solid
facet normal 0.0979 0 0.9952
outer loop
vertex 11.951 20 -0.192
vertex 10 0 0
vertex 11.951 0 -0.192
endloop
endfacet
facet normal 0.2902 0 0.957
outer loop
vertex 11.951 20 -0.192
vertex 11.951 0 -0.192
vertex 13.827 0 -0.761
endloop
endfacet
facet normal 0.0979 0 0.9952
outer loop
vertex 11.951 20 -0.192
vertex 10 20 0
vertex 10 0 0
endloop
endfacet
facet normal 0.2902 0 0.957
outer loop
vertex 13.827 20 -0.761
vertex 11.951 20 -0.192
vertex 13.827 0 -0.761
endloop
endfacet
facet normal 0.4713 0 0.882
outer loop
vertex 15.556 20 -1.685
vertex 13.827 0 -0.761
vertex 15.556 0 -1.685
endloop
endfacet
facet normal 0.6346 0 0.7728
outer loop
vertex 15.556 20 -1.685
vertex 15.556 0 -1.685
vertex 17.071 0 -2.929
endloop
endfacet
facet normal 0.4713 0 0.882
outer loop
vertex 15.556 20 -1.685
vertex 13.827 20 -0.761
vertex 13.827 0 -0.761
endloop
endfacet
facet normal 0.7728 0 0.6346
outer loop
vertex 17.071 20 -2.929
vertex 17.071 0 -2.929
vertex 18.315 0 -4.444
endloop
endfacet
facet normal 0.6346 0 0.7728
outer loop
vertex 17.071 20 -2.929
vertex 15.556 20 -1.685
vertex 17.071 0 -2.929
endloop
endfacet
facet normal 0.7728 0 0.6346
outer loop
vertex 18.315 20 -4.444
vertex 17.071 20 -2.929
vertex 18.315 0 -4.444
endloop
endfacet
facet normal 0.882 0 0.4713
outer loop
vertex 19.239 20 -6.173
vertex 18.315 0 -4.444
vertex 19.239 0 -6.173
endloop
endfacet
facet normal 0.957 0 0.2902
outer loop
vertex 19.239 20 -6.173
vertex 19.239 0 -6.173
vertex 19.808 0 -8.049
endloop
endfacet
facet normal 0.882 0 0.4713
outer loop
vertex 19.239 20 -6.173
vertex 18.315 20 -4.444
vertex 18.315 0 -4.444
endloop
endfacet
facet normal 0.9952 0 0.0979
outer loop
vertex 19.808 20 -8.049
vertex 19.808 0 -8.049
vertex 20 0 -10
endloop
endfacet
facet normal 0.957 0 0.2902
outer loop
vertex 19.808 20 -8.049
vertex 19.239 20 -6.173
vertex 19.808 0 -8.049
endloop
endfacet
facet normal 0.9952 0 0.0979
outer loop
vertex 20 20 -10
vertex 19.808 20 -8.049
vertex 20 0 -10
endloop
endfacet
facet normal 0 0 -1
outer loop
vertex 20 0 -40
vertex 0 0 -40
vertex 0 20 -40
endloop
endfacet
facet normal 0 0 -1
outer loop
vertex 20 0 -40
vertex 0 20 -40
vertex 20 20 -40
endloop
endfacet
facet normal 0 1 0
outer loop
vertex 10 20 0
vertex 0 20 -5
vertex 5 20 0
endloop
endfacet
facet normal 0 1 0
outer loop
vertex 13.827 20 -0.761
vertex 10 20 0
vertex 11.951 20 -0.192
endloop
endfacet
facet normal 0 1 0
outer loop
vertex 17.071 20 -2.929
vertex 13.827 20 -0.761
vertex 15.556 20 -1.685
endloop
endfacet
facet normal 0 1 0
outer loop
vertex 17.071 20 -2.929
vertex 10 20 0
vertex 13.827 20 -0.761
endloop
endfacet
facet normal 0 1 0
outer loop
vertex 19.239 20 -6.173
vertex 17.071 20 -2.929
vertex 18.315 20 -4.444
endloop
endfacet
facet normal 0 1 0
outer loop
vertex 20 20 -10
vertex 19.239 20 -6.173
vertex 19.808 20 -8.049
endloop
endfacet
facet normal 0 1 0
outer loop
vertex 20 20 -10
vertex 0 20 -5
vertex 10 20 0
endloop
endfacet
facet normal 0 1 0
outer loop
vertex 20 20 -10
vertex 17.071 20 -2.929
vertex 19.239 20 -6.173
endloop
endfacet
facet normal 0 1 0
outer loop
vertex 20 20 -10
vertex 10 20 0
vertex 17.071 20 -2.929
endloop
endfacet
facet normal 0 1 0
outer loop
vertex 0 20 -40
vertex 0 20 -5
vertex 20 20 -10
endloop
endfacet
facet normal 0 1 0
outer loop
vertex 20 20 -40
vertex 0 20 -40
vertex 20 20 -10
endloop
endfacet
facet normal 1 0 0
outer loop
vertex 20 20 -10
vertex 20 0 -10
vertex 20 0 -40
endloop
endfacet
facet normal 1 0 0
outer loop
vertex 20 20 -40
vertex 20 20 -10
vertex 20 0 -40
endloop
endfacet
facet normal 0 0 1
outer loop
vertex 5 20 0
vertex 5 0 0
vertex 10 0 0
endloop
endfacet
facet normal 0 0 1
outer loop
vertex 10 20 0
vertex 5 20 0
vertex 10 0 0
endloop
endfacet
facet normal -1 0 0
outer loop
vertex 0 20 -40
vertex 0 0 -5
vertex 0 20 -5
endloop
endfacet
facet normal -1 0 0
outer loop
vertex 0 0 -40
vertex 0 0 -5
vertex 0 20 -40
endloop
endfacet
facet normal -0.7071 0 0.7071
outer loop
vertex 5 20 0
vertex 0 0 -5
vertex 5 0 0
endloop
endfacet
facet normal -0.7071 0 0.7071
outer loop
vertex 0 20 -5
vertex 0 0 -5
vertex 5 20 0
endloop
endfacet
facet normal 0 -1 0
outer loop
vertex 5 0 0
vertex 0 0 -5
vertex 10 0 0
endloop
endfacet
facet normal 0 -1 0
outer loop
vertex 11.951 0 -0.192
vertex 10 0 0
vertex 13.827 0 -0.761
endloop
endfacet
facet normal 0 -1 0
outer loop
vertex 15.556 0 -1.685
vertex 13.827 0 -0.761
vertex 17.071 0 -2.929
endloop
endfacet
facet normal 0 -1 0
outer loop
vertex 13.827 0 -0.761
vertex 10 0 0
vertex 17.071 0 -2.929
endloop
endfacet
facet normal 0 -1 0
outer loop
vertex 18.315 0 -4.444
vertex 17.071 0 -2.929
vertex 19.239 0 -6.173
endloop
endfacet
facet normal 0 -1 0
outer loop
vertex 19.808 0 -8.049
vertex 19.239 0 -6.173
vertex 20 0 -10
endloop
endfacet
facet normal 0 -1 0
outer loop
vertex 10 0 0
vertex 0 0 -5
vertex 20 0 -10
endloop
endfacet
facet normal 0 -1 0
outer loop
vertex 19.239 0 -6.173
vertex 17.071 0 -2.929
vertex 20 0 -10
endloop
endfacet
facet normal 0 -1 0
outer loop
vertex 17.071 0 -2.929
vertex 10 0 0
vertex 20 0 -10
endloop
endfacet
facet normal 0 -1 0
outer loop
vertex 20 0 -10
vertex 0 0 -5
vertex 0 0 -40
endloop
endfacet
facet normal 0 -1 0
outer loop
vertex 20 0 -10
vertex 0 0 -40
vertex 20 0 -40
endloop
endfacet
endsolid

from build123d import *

# Parameters (mm, degrees)
SKETCH2_W           = 20
SKETCH2_H           = 40
BOSS_EXTRUDE1_DEPTH = 20
FILLET1_R           = 10
CHAMFER1_SIZE       = 5


with BuildPart() as part:
    # Sketch2 → Boss-Extrude1 (new body)
    with BuildSketch(Plane(origin=(0, 0, 0), x_dir=(1, 0, 0), z_dir=(0, 1, 0))):
        with Locations((10, 20)):
            Rectangle(SKETCH2_W, SKETCH2_H)
    extrude(amount=BOSS_EXTRUDE1_DEPTH)

    # Fillet1
    fillet1_edges = [part.edges().sort_by_distance(p)[0] for p in [
        (20, 10, 0),
    ]]
    fillet(fillet1_edges, radius=FILLET1_R)

    # Chamfer1
    chamfer1_edges = [part.edges().sort_by_distance(p)[0] for p in [
        (0, 10, 0),
    ]]
    chamfer(chamfer1_edges, length=CHAMFER1_SIZE)


solid = part.part
